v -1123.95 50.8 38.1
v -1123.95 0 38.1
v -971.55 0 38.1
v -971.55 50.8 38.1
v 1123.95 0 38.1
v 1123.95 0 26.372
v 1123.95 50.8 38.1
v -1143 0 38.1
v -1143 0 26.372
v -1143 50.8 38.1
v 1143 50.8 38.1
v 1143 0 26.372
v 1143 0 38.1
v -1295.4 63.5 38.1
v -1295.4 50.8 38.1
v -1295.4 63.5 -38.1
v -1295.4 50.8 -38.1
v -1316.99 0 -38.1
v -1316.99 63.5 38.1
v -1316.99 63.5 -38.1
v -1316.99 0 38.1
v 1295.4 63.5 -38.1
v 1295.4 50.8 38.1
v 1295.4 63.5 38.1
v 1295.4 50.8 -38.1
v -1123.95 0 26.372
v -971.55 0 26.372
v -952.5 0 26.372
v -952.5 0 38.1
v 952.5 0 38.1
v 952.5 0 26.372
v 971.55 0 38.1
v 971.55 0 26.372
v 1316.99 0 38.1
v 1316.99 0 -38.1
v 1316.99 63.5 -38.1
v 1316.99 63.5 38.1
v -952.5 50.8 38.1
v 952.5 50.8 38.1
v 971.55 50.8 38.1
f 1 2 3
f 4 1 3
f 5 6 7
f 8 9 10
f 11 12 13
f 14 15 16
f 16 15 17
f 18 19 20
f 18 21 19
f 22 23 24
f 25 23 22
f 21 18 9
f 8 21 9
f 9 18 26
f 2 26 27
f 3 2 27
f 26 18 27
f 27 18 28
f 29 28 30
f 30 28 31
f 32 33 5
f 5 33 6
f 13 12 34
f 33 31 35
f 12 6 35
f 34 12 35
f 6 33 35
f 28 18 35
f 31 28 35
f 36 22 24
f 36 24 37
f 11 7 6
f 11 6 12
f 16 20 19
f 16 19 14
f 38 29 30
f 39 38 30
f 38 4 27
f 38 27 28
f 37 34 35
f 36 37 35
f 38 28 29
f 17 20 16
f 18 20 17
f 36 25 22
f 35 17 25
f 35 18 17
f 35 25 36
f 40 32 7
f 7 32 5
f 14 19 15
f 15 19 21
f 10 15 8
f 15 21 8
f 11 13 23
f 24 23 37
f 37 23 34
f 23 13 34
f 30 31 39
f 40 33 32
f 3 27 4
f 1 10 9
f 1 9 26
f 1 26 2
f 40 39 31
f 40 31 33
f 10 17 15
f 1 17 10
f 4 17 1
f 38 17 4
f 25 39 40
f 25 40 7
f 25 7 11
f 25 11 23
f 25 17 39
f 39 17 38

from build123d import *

# Parameters (mm, degrees)
SKETCH1_W           = 2633.98
SKETCH1_H           = 76.2
BOSS_EXTRUDE1_DEPTH = 50.8
SKETCH2_W           = 19.05
SKETCH2_H           = 63.5
CUT_REVOLVE4_ANGLE  = 103
SKETCH3_W           = 21.59
SKETCH3_H           = 76.2
BOSS_EXTRUDE2_DEPTH = 12.7


with BuildPart() as part:
    # Sketch1 → Boss-Extrude1 (new body)
    with BuildSketch(Plane(origin=(0, 0, 0), x_dir=(1, 0, 0), z_dir=(0, 1, 0))):
        Rectangle(SKETCH1_W, SKETCH1_H)
    extrude(amount=BOSS_EXTRUDE1_DEPTH)

    # Sketch2 → Cut-Revolve4 (revolve, cut)
    with BuildSketch(Plane(origin=(0, 50.8, 0), x_dir=(1, 0, 0), z_dir=(0, 1, 0))):
        with Locations((-962.025, -69.85)):
            Rectangle(SKETCH2_W, SKETCH2_H)
        with Locations((-1133.475, -69.85)):
            Rectangle(SKETCH2_W, SKETCH2_H)
        with Locations((962.025, -69.85)):
            Rectangle(SKETCH2_W, SKETCH2_H)
        with Locations((1133.475, -69.85)):
            Rectangle(SKETCH2_W, SKETCH2_H)
    revolve(axis=Axis((-1316.99, 50.8, 38.1), (1, 0, 0)), revolution_arc=CUT_REVOLVE4_ANGLE, mode=Mode.SUBTRACT)

    # Sketch3 → Boss-Extrude2 (add)
    with BuildSketch(Plane(origin=(0, 50.8, 0), x_dir=(1, 0, 0), z_dir=(0, 1, 0))):
        with Locations((-1306.195, 0)):
            Rectangle(SKETCH3_W, SKETCH3_H)
        with Locations((1306.195, 0)):
            Rectangle(SKETCH3_W, SKETCH3_H)
    extrude(amount=BOSS_EXTRUDE2_DEPTH)


solid = part.part
